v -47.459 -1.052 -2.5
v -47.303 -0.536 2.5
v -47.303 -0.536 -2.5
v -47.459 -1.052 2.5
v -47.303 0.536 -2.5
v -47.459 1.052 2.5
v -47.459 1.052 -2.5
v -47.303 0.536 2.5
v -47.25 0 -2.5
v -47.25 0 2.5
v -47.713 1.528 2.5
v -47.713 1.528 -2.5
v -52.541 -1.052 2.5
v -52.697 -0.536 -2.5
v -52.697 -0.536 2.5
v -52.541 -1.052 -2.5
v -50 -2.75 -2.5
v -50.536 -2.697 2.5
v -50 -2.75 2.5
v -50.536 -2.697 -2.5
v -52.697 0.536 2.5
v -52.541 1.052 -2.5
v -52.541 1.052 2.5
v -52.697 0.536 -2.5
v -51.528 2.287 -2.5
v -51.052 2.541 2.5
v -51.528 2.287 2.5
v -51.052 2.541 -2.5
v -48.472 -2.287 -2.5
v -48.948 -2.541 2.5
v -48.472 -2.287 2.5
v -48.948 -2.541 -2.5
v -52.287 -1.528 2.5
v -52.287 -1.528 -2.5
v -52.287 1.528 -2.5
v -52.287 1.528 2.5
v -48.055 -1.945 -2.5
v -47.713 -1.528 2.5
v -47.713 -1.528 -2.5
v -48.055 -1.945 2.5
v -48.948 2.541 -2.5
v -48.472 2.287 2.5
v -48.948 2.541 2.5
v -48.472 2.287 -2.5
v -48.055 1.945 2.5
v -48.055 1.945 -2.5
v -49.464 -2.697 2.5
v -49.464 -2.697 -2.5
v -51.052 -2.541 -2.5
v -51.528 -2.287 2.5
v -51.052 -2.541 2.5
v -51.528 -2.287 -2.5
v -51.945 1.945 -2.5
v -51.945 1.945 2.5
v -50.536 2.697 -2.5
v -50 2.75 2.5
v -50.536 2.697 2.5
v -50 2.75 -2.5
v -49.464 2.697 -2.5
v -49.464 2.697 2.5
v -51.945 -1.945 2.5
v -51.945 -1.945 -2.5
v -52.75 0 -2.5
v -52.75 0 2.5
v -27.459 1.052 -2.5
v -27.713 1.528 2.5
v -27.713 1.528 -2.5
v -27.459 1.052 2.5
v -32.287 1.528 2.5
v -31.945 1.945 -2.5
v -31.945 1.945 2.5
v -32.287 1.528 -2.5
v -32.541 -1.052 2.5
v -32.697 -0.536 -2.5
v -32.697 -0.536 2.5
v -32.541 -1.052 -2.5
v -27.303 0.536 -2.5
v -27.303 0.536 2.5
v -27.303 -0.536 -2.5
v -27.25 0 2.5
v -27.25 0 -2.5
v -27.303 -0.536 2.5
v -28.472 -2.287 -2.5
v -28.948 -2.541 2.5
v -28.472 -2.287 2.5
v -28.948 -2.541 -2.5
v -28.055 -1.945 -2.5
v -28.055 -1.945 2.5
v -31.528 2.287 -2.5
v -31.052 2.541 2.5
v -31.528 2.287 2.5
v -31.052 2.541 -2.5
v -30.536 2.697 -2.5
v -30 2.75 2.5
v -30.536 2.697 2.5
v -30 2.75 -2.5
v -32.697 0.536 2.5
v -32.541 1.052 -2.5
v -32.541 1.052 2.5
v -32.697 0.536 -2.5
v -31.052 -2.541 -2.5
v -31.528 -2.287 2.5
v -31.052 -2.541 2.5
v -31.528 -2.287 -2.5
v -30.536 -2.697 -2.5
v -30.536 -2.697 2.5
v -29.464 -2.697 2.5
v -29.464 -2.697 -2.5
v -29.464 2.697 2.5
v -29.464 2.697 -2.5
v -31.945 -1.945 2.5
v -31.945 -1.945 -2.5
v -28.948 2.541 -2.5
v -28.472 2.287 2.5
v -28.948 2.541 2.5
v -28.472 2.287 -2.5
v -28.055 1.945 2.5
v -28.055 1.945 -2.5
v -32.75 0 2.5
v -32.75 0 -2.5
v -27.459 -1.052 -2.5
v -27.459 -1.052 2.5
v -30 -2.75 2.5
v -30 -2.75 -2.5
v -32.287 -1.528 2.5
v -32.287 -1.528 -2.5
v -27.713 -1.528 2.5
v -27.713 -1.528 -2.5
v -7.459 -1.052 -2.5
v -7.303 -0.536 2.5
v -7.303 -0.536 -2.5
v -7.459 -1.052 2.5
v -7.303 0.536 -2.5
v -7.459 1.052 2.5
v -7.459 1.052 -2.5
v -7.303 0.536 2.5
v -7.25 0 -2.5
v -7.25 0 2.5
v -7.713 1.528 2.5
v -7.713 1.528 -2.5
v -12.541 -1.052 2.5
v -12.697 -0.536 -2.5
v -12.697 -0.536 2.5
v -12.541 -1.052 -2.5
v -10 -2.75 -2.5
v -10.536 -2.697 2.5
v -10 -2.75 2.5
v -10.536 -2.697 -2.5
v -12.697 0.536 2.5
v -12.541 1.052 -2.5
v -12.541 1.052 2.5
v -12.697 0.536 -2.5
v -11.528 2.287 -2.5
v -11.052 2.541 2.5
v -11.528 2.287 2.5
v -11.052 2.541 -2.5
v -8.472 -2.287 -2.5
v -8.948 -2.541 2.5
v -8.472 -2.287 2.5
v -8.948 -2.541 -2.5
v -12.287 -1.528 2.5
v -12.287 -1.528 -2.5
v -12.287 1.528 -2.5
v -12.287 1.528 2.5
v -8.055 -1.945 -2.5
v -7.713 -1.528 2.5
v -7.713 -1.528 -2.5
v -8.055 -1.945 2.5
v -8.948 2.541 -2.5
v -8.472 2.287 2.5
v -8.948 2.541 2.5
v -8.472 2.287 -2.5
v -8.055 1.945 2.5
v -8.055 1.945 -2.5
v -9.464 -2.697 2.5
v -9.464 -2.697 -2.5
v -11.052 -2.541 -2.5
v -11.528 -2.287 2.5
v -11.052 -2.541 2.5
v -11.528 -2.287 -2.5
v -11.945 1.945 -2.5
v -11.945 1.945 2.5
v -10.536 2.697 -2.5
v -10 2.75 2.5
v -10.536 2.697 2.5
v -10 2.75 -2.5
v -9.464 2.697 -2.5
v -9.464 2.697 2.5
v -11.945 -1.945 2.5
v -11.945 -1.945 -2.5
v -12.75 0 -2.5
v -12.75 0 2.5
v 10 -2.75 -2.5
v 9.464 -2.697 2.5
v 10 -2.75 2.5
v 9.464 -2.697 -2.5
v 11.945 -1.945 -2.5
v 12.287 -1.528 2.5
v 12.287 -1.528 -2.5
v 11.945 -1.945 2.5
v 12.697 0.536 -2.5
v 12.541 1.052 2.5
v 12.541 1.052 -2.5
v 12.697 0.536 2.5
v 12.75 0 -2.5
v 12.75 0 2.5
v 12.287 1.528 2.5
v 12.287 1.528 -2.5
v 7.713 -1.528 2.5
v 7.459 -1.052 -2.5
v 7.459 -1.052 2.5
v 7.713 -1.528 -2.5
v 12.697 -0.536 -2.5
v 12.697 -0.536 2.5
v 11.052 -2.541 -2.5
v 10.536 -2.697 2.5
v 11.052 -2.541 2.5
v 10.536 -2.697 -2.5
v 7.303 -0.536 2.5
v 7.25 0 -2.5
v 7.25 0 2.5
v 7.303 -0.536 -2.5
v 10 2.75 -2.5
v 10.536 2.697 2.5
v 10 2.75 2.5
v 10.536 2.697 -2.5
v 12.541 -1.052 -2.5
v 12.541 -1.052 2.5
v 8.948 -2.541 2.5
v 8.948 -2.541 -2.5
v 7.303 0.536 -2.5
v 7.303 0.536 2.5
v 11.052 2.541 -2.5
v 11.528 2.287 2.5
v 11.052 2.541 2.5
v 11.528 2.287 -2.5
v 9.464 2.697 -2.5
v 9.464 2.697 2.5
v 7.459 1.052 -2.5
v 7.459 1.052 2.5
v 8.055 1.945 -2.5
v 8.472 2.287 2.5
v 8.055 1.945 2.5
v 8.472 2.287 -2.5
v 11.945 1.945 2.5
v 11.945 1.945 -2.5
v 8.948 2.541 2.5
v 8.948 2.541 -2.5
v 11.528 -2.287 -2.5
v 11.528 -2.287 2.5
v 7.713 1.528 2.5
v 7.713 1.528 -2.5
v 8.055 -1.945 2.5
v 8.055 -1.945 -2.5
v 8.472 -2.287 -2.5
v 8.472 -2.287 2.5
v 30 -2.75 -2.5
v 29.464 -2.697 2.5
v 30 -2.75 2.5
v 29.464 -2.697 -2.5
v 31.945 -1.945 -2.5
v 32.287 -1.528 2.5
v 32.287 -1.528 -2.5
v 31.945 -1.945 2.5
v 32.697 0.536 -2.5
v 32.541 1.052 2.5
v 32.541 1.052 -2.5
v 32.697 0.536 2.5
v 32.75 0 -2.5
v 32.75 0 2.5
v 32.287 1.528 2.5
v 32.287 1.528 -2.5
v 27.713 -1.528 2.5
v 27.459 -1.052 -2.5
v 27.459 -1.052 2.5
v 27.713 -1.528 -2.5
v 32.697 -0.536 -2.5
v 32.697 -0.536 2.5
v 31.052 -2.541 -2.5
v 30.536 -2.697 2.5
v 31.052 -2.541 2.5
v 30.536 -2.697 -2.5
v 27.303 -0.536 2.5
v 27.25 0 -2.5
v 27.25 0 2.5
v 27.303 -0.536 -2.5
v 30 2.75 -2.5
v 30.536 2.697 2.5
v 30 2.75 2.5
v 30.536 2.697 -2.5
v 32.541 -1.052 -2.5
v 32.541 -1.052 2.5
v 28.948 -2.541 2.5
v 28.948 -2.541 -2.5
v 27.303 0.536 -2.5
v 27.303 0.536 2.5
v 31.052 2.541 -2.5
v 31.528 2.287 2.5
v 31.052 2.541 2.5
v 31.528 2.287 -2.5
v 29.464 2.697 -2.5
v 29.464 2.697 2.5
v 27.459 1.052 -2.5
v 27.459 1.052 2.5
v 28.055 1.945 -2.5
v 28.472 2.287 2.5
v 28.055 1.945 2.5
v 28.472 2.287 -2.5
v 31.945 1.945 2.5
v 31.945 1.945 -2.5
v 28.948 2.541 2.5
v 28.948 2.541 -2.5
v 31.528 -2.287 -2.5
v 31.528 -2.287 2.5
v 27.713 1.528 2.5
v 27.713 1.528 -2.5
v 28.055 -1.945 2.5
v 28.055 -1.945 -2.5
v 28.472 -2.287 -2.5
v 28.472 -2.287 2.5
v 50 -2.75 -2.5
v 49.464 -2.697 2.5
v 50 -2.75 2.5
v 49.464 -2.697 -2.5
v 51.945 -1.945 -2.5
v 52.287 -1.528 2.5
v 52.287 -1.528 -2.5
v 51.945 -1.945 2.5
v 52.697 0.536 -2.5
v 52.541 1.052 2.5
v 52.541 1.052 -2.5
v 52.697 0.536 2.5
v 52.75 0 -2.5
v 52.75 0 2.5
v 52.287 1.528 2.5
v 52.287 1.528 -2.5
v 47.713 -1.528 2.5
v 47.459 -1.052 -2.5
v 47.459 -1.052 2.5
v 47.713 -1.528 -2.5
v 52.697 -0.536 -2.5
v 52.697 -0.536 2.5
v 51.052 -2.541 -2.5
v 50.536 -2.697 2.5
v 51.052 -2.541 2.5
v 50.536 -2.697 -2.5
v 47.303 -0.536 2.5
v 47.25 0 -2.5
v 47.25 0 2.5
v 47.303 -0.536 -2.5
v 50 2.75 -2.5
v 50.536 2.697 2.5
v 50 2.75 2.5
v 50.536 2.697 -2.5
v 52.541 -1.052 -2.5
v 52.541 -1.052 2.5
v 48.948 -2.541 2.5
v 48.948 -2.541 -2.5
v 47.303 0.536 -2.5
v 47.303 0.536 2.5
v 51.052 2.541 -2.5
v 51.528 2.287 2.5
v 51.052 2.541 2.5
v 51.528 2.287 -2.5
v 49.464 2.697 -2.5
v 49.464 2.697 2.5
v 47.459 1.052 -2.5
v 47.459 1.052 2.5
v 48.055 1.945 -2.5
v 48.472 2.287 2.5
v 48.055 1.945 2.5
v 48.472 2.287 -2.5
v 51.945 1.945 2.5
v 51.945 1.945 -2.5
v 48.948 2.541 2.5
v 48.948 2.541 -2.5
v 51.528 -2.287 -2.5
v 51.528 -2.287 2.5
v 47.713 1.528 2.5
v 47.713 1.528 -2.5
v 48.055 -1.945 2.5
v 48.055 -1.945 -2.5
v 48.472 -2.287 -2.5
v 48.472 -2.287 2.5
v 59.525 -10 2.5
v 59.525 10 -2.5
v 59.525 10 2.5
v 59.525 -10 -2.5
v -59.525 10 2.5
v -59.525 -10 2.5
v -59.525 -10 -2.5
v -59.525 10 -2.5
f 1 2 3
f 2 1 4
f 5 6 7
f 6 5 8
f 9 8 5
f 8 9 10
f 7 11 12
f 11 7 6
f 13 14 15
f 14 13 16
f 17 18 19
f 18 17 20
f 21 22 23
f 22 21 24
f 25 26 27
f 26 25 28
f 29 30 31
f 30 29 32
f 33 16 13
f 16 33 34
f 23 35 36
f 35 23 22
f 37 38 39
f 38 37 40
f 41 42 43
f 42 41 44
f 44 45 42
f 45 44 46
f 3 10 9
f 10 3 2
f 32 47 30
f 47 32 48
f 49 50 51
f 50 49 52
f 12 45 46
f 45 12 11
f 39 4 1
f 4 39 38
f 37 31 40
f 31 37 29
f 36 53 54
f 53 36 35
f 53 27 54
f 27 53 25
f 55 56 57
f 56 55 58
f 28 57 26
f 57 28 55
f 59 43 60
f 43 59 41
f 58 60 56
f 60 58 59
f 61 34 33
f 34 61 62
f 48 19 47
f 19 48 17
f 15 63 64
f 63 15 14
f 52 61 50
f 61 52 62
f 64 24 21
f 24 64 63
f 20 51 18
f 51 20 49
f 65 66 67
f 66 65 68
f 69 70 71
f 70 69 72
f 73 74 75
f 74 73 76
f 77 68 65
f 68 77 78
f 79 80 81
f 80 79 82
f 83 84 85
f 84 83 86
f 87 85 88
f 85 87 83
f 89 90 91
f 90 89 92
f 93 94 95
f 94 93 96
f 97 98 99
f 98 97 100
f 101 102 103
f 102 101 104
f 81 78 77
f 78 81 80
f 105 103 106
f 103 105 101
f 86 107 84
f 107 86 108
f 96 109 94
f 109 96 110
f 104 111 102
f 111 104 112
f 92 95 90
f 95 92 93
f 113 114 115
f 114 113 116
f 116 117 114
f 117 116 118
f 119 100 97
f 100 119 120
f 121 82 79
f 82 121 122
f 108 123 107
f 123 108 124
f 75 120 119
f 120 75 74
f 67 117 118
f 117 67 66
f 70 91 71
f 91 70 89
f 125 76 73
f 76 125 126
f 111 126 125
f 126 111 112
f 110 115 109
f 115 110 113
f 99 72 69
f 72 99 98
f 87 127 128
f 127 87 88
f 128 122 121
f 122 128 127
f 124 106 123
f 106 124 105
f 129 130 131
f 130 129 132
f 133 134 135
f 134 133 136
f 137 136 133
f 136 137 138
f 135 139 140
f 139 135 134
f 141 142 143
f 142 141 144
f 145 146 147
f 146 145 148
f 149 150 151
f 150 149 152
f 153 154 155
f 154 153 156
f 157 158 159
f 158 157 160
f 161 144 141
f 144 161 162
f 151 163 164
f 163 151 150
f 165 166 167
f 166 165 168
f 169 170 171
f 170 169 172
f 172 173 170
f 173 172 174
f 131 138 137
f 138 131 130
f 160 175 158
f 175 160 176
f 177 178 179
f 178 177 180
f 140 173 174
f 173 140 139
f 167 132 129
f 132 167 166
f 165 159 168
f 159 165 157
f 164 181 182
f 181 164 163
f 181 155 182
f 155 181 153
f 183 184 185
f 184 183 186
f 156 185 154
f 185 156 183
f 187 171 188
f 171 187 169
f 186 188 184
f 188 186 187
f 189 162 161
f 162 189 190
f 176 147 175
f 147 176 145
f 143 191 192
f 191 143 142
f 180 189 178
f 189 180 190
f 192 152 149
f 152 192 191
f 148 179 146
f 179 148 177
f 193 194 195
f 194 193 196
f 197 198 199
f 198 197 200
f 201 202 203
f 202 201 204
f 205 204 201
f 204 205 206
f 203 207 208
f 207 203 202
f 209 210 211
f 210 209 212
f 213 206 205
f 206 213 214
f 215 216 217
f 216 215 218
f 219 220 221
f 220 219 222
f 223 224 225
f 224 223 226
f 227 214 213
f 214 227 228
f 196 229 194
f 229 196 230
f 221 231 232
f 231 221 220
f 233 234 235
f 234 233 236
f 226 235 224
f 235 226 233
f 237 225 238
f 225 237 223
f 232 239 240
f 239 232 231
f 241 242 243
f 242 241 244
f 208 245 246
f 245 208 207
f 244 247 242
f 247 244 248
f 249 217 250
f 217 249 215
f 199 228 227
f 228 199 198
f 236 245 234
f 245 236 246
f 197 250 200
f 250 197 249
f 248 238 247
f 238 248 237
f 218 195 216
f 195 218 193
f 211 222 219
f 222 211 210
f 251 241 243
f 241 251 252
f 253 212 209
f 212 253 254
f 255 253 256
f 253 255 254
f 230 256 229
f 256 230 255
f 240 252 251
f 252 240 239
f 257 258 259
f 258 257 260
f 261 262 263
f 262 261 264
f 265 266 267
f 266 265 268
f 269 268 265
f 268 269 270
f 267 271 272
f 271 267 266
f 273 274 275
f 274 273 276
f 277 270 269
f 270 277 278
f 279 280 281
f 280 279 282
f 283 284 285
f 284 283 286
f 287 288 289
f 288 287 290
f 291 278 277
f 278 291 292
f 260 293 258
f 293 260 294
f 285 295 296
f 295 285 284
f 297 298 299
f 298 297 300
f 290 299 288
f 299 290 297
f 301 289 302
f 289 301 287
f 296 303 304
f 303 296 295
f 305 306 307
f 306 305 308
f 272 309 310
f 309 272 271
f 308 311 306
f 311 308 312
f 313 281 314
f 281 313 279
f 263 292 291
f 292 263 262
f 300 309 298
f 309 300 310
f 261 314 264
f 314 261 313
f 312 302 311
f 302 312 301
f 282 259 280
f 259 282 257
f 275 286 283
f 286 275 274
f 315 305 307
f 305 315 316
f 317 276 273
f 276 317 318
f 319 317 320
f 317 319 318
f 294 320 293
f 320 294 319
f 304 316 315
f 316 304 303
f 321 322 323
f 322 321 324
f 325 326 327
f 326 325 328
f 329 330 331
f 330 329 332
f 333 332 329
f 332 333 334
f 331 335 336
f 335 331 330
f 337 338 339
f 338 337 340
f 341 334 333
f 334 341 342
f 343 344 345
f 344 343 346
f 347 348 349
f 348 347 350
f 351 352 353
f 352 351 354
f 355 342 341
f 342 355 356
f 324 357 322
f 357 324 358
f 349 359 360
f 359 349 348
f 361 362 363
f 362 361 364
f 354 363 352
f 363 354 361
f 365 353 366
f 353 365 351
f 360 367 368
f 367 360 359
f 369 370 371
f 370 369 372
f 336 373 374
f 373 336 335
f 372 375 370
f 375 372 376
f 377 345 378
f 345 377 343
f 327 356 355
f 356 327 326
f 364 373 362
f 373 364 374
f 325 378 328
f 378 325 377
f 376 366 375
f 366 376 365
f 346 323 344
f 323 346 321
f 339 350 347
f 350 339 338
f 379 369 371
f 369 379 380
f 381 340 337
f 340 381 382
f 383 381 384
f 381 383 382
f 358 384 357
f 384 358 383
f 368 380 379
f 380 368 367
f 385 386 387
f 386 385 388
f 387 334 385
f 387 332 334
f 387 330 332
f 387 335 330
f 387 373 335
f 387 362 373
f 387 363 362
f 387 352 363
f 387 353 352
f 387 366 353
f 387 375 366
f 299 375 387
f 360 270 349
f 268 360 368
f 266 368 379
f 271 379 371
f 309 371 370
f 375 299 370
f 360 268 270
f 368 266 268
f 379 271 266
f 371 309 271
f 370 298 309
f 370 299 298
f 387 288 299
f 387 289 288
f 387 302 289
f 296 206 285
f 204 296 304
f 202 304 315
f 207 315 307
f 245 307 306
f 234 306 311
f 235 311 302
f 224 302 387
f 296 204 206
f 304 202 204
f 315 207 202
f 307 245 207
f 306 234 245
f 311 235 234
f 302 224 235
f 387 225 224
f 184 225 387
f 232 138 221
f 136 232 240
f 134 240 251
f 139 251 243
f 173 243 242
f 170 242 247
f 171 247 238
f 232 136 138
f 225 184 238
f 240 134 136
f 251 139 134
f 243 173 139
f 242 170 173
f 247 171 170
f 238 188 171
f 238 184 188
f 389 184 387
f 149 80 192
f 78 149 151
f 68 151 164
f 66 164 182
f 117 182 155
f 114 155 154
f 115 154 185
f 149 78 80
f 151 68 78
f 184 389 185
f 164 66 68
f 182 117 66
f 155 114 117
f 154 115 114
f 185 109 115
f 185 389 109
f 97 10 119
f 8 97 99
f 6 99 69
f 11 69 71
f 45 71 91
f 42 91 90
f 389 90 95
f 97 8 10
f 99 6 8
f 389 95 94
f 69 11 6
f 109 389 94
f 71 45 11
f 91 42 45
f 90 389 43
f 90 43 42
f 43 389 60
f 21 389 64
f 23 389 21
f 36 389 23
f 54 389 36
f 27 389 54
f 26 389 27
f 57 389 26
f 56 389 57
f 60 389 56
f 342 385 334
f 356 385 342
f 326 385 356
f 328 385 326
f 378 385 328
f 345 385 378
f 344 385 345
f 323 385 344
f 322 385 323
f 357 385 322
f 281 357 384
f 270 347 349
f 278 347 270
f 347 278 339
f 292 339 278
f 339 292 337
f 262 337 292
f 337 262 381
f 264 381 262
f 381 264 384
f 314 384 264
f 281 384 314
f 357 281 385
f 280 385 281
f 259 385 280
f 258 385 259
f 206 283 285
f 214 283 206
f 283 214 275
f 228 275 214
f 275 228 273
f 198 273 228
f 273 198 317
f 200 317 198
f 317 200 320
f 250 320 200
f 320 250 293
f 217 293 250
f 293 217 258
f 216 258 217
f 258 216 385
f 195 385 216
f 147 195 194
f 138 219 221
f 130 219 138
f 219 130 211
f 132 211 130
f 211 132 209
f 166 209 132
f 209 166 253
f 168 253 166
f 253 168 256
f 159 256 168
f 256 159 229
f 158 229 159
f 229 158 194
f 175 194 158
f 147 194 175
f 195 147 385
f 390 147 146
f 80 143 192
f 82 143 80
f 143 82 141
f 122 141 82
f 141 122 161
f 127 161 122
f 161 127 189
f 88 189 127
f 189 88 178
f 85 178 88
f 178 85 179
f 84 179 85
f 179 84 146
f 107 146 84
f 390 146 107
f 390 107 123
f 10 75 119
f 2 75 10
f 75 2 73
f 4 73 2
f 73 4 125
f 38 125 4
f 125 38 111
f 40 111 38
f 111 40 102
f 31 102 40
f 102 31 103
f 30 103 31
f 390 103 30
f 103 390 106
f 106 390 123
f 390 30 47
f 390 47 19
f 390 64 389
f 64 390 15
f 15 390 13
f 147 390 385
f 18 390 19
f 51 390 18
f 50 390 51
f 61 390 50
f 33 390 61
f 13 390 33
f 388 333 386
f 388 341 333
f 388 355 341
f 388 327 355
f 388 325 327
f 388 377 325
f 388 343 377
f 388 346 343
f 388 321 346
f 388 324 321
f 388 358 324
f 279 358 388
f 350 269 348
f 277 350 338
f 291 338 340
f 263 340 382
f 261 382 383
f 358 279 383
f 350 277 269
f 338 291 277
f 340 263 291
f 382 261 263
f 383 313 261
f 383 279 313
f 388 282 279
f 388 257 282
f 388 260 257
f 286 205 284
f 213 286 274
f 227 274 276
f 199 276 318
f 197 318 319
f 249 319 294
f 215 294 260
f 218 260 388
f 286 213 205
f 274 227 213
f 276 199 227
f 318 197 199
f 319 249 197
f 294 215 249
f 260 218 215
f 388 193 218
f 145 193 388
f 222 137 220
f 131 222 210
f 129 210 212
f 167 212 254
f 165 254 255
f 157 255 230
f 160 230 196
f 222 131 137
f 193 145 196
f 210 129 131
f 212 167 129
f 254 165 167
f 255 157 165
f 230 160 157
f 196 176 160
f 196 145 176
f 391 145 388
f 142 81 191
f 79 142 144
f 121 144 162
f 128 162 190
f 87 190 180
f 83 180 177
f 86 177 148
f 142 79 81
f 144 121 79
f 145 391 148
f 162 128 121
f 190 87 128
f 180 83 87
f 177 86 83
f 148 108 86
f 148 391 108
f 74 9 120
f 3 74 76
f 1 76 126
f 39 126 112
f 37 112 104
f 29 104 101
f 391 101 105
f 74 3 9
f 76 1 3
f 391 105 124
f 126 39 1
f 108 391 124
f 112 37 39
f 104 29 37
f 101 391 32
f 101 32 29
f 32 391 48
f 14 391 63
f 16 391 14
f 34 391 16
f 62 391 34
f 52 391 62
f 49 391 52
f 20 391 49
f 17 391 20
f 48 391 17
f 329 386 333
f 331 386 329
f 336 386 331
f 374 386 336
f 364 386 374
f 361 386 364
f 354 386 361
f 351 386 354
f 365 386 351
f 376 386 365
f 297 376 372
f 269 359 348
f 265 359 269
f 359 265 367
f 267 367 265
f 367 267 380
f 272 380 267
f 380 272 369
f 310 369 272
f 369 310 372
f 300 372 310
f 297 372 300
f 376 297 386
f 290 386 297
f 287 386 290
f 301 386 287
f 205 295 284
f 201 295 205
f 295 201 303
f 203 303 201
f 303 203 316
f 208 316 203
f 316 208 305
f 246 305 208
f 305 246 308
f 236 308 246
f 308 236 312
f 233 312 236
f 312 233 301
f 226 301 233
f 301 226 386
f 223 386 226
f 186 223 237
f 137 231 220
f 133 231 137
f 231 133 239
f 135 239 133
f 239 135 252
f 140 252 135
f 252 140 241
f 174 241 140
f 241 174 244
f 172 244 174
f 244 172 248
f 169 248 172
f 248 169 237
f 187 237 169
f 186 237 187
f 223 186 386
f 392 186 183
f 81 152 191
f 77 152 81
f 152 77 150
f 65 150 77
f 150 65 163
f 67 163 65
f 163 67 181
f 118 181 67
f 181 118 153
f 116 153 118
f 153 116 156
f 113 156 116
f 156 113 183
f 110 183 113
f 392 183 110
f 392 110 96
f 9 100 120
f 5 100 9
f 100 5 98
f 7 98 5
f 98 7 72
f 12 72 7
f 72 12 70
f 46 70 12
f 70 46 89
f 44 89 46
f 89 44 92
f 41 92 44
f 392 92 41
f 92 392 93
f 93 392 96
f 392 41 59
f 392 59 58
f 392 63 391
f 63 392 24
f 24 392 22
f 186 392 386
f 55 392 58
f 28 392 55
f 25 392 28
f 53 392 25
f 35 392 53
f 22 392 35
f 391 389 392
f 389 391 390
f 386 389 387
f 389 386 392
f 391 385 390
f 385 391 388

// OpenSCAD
$fn = 32;

// ----------------------------------------------------------------------
// Hole bar, 6 x Ø5.5
// row layout, 9.525 mm edge offset
// ----------------------------------------------------------------------

// --- parameters (mm) ---
bar_w = 20;    // bar width (Y)
bar_t = 5;     // bar thickness (Z)
holes = 6;     // holes per row
hole_d = 5.5;  // hole diameter
edge = 9.525;  // offset from the bar end to the first hole
pitch = 20;    // pitch between neighbouring holes

// --- derived feature positions (mm) ---
span = (holes - 1) * pitch;   // = 100   distance between the end holes
bar_l = span + 2 * edge;      // = 119.05   overall bar length
start_x = -bar_l / 2 + edge;  // = -50   X of the first hole
feature_centers = [
  [start_x + 0 * pitch, 0],
  [start_x + 1 * pitch, 0],
  [start_x + 2 * pitch, 0],
  [start_x + 3 * pitch, 0],
  [start_x + 4 * pitch, 0],
  [start_x + 5 * pitch, 0]
];   // hole centres of the first row

// bar with one row of holes, drilled from feature_centers
difference() {
  translate([-bar_l / 2, -bar_w / 2, -bar_t / 2]) cube([bar_l, bar_w, bar_t]);
  for (centre = feature_centers)
    translate([centre[0], centre[1], 0])
      cylinder(d = hole_d, h = bar_t + 2, center = true);
}
